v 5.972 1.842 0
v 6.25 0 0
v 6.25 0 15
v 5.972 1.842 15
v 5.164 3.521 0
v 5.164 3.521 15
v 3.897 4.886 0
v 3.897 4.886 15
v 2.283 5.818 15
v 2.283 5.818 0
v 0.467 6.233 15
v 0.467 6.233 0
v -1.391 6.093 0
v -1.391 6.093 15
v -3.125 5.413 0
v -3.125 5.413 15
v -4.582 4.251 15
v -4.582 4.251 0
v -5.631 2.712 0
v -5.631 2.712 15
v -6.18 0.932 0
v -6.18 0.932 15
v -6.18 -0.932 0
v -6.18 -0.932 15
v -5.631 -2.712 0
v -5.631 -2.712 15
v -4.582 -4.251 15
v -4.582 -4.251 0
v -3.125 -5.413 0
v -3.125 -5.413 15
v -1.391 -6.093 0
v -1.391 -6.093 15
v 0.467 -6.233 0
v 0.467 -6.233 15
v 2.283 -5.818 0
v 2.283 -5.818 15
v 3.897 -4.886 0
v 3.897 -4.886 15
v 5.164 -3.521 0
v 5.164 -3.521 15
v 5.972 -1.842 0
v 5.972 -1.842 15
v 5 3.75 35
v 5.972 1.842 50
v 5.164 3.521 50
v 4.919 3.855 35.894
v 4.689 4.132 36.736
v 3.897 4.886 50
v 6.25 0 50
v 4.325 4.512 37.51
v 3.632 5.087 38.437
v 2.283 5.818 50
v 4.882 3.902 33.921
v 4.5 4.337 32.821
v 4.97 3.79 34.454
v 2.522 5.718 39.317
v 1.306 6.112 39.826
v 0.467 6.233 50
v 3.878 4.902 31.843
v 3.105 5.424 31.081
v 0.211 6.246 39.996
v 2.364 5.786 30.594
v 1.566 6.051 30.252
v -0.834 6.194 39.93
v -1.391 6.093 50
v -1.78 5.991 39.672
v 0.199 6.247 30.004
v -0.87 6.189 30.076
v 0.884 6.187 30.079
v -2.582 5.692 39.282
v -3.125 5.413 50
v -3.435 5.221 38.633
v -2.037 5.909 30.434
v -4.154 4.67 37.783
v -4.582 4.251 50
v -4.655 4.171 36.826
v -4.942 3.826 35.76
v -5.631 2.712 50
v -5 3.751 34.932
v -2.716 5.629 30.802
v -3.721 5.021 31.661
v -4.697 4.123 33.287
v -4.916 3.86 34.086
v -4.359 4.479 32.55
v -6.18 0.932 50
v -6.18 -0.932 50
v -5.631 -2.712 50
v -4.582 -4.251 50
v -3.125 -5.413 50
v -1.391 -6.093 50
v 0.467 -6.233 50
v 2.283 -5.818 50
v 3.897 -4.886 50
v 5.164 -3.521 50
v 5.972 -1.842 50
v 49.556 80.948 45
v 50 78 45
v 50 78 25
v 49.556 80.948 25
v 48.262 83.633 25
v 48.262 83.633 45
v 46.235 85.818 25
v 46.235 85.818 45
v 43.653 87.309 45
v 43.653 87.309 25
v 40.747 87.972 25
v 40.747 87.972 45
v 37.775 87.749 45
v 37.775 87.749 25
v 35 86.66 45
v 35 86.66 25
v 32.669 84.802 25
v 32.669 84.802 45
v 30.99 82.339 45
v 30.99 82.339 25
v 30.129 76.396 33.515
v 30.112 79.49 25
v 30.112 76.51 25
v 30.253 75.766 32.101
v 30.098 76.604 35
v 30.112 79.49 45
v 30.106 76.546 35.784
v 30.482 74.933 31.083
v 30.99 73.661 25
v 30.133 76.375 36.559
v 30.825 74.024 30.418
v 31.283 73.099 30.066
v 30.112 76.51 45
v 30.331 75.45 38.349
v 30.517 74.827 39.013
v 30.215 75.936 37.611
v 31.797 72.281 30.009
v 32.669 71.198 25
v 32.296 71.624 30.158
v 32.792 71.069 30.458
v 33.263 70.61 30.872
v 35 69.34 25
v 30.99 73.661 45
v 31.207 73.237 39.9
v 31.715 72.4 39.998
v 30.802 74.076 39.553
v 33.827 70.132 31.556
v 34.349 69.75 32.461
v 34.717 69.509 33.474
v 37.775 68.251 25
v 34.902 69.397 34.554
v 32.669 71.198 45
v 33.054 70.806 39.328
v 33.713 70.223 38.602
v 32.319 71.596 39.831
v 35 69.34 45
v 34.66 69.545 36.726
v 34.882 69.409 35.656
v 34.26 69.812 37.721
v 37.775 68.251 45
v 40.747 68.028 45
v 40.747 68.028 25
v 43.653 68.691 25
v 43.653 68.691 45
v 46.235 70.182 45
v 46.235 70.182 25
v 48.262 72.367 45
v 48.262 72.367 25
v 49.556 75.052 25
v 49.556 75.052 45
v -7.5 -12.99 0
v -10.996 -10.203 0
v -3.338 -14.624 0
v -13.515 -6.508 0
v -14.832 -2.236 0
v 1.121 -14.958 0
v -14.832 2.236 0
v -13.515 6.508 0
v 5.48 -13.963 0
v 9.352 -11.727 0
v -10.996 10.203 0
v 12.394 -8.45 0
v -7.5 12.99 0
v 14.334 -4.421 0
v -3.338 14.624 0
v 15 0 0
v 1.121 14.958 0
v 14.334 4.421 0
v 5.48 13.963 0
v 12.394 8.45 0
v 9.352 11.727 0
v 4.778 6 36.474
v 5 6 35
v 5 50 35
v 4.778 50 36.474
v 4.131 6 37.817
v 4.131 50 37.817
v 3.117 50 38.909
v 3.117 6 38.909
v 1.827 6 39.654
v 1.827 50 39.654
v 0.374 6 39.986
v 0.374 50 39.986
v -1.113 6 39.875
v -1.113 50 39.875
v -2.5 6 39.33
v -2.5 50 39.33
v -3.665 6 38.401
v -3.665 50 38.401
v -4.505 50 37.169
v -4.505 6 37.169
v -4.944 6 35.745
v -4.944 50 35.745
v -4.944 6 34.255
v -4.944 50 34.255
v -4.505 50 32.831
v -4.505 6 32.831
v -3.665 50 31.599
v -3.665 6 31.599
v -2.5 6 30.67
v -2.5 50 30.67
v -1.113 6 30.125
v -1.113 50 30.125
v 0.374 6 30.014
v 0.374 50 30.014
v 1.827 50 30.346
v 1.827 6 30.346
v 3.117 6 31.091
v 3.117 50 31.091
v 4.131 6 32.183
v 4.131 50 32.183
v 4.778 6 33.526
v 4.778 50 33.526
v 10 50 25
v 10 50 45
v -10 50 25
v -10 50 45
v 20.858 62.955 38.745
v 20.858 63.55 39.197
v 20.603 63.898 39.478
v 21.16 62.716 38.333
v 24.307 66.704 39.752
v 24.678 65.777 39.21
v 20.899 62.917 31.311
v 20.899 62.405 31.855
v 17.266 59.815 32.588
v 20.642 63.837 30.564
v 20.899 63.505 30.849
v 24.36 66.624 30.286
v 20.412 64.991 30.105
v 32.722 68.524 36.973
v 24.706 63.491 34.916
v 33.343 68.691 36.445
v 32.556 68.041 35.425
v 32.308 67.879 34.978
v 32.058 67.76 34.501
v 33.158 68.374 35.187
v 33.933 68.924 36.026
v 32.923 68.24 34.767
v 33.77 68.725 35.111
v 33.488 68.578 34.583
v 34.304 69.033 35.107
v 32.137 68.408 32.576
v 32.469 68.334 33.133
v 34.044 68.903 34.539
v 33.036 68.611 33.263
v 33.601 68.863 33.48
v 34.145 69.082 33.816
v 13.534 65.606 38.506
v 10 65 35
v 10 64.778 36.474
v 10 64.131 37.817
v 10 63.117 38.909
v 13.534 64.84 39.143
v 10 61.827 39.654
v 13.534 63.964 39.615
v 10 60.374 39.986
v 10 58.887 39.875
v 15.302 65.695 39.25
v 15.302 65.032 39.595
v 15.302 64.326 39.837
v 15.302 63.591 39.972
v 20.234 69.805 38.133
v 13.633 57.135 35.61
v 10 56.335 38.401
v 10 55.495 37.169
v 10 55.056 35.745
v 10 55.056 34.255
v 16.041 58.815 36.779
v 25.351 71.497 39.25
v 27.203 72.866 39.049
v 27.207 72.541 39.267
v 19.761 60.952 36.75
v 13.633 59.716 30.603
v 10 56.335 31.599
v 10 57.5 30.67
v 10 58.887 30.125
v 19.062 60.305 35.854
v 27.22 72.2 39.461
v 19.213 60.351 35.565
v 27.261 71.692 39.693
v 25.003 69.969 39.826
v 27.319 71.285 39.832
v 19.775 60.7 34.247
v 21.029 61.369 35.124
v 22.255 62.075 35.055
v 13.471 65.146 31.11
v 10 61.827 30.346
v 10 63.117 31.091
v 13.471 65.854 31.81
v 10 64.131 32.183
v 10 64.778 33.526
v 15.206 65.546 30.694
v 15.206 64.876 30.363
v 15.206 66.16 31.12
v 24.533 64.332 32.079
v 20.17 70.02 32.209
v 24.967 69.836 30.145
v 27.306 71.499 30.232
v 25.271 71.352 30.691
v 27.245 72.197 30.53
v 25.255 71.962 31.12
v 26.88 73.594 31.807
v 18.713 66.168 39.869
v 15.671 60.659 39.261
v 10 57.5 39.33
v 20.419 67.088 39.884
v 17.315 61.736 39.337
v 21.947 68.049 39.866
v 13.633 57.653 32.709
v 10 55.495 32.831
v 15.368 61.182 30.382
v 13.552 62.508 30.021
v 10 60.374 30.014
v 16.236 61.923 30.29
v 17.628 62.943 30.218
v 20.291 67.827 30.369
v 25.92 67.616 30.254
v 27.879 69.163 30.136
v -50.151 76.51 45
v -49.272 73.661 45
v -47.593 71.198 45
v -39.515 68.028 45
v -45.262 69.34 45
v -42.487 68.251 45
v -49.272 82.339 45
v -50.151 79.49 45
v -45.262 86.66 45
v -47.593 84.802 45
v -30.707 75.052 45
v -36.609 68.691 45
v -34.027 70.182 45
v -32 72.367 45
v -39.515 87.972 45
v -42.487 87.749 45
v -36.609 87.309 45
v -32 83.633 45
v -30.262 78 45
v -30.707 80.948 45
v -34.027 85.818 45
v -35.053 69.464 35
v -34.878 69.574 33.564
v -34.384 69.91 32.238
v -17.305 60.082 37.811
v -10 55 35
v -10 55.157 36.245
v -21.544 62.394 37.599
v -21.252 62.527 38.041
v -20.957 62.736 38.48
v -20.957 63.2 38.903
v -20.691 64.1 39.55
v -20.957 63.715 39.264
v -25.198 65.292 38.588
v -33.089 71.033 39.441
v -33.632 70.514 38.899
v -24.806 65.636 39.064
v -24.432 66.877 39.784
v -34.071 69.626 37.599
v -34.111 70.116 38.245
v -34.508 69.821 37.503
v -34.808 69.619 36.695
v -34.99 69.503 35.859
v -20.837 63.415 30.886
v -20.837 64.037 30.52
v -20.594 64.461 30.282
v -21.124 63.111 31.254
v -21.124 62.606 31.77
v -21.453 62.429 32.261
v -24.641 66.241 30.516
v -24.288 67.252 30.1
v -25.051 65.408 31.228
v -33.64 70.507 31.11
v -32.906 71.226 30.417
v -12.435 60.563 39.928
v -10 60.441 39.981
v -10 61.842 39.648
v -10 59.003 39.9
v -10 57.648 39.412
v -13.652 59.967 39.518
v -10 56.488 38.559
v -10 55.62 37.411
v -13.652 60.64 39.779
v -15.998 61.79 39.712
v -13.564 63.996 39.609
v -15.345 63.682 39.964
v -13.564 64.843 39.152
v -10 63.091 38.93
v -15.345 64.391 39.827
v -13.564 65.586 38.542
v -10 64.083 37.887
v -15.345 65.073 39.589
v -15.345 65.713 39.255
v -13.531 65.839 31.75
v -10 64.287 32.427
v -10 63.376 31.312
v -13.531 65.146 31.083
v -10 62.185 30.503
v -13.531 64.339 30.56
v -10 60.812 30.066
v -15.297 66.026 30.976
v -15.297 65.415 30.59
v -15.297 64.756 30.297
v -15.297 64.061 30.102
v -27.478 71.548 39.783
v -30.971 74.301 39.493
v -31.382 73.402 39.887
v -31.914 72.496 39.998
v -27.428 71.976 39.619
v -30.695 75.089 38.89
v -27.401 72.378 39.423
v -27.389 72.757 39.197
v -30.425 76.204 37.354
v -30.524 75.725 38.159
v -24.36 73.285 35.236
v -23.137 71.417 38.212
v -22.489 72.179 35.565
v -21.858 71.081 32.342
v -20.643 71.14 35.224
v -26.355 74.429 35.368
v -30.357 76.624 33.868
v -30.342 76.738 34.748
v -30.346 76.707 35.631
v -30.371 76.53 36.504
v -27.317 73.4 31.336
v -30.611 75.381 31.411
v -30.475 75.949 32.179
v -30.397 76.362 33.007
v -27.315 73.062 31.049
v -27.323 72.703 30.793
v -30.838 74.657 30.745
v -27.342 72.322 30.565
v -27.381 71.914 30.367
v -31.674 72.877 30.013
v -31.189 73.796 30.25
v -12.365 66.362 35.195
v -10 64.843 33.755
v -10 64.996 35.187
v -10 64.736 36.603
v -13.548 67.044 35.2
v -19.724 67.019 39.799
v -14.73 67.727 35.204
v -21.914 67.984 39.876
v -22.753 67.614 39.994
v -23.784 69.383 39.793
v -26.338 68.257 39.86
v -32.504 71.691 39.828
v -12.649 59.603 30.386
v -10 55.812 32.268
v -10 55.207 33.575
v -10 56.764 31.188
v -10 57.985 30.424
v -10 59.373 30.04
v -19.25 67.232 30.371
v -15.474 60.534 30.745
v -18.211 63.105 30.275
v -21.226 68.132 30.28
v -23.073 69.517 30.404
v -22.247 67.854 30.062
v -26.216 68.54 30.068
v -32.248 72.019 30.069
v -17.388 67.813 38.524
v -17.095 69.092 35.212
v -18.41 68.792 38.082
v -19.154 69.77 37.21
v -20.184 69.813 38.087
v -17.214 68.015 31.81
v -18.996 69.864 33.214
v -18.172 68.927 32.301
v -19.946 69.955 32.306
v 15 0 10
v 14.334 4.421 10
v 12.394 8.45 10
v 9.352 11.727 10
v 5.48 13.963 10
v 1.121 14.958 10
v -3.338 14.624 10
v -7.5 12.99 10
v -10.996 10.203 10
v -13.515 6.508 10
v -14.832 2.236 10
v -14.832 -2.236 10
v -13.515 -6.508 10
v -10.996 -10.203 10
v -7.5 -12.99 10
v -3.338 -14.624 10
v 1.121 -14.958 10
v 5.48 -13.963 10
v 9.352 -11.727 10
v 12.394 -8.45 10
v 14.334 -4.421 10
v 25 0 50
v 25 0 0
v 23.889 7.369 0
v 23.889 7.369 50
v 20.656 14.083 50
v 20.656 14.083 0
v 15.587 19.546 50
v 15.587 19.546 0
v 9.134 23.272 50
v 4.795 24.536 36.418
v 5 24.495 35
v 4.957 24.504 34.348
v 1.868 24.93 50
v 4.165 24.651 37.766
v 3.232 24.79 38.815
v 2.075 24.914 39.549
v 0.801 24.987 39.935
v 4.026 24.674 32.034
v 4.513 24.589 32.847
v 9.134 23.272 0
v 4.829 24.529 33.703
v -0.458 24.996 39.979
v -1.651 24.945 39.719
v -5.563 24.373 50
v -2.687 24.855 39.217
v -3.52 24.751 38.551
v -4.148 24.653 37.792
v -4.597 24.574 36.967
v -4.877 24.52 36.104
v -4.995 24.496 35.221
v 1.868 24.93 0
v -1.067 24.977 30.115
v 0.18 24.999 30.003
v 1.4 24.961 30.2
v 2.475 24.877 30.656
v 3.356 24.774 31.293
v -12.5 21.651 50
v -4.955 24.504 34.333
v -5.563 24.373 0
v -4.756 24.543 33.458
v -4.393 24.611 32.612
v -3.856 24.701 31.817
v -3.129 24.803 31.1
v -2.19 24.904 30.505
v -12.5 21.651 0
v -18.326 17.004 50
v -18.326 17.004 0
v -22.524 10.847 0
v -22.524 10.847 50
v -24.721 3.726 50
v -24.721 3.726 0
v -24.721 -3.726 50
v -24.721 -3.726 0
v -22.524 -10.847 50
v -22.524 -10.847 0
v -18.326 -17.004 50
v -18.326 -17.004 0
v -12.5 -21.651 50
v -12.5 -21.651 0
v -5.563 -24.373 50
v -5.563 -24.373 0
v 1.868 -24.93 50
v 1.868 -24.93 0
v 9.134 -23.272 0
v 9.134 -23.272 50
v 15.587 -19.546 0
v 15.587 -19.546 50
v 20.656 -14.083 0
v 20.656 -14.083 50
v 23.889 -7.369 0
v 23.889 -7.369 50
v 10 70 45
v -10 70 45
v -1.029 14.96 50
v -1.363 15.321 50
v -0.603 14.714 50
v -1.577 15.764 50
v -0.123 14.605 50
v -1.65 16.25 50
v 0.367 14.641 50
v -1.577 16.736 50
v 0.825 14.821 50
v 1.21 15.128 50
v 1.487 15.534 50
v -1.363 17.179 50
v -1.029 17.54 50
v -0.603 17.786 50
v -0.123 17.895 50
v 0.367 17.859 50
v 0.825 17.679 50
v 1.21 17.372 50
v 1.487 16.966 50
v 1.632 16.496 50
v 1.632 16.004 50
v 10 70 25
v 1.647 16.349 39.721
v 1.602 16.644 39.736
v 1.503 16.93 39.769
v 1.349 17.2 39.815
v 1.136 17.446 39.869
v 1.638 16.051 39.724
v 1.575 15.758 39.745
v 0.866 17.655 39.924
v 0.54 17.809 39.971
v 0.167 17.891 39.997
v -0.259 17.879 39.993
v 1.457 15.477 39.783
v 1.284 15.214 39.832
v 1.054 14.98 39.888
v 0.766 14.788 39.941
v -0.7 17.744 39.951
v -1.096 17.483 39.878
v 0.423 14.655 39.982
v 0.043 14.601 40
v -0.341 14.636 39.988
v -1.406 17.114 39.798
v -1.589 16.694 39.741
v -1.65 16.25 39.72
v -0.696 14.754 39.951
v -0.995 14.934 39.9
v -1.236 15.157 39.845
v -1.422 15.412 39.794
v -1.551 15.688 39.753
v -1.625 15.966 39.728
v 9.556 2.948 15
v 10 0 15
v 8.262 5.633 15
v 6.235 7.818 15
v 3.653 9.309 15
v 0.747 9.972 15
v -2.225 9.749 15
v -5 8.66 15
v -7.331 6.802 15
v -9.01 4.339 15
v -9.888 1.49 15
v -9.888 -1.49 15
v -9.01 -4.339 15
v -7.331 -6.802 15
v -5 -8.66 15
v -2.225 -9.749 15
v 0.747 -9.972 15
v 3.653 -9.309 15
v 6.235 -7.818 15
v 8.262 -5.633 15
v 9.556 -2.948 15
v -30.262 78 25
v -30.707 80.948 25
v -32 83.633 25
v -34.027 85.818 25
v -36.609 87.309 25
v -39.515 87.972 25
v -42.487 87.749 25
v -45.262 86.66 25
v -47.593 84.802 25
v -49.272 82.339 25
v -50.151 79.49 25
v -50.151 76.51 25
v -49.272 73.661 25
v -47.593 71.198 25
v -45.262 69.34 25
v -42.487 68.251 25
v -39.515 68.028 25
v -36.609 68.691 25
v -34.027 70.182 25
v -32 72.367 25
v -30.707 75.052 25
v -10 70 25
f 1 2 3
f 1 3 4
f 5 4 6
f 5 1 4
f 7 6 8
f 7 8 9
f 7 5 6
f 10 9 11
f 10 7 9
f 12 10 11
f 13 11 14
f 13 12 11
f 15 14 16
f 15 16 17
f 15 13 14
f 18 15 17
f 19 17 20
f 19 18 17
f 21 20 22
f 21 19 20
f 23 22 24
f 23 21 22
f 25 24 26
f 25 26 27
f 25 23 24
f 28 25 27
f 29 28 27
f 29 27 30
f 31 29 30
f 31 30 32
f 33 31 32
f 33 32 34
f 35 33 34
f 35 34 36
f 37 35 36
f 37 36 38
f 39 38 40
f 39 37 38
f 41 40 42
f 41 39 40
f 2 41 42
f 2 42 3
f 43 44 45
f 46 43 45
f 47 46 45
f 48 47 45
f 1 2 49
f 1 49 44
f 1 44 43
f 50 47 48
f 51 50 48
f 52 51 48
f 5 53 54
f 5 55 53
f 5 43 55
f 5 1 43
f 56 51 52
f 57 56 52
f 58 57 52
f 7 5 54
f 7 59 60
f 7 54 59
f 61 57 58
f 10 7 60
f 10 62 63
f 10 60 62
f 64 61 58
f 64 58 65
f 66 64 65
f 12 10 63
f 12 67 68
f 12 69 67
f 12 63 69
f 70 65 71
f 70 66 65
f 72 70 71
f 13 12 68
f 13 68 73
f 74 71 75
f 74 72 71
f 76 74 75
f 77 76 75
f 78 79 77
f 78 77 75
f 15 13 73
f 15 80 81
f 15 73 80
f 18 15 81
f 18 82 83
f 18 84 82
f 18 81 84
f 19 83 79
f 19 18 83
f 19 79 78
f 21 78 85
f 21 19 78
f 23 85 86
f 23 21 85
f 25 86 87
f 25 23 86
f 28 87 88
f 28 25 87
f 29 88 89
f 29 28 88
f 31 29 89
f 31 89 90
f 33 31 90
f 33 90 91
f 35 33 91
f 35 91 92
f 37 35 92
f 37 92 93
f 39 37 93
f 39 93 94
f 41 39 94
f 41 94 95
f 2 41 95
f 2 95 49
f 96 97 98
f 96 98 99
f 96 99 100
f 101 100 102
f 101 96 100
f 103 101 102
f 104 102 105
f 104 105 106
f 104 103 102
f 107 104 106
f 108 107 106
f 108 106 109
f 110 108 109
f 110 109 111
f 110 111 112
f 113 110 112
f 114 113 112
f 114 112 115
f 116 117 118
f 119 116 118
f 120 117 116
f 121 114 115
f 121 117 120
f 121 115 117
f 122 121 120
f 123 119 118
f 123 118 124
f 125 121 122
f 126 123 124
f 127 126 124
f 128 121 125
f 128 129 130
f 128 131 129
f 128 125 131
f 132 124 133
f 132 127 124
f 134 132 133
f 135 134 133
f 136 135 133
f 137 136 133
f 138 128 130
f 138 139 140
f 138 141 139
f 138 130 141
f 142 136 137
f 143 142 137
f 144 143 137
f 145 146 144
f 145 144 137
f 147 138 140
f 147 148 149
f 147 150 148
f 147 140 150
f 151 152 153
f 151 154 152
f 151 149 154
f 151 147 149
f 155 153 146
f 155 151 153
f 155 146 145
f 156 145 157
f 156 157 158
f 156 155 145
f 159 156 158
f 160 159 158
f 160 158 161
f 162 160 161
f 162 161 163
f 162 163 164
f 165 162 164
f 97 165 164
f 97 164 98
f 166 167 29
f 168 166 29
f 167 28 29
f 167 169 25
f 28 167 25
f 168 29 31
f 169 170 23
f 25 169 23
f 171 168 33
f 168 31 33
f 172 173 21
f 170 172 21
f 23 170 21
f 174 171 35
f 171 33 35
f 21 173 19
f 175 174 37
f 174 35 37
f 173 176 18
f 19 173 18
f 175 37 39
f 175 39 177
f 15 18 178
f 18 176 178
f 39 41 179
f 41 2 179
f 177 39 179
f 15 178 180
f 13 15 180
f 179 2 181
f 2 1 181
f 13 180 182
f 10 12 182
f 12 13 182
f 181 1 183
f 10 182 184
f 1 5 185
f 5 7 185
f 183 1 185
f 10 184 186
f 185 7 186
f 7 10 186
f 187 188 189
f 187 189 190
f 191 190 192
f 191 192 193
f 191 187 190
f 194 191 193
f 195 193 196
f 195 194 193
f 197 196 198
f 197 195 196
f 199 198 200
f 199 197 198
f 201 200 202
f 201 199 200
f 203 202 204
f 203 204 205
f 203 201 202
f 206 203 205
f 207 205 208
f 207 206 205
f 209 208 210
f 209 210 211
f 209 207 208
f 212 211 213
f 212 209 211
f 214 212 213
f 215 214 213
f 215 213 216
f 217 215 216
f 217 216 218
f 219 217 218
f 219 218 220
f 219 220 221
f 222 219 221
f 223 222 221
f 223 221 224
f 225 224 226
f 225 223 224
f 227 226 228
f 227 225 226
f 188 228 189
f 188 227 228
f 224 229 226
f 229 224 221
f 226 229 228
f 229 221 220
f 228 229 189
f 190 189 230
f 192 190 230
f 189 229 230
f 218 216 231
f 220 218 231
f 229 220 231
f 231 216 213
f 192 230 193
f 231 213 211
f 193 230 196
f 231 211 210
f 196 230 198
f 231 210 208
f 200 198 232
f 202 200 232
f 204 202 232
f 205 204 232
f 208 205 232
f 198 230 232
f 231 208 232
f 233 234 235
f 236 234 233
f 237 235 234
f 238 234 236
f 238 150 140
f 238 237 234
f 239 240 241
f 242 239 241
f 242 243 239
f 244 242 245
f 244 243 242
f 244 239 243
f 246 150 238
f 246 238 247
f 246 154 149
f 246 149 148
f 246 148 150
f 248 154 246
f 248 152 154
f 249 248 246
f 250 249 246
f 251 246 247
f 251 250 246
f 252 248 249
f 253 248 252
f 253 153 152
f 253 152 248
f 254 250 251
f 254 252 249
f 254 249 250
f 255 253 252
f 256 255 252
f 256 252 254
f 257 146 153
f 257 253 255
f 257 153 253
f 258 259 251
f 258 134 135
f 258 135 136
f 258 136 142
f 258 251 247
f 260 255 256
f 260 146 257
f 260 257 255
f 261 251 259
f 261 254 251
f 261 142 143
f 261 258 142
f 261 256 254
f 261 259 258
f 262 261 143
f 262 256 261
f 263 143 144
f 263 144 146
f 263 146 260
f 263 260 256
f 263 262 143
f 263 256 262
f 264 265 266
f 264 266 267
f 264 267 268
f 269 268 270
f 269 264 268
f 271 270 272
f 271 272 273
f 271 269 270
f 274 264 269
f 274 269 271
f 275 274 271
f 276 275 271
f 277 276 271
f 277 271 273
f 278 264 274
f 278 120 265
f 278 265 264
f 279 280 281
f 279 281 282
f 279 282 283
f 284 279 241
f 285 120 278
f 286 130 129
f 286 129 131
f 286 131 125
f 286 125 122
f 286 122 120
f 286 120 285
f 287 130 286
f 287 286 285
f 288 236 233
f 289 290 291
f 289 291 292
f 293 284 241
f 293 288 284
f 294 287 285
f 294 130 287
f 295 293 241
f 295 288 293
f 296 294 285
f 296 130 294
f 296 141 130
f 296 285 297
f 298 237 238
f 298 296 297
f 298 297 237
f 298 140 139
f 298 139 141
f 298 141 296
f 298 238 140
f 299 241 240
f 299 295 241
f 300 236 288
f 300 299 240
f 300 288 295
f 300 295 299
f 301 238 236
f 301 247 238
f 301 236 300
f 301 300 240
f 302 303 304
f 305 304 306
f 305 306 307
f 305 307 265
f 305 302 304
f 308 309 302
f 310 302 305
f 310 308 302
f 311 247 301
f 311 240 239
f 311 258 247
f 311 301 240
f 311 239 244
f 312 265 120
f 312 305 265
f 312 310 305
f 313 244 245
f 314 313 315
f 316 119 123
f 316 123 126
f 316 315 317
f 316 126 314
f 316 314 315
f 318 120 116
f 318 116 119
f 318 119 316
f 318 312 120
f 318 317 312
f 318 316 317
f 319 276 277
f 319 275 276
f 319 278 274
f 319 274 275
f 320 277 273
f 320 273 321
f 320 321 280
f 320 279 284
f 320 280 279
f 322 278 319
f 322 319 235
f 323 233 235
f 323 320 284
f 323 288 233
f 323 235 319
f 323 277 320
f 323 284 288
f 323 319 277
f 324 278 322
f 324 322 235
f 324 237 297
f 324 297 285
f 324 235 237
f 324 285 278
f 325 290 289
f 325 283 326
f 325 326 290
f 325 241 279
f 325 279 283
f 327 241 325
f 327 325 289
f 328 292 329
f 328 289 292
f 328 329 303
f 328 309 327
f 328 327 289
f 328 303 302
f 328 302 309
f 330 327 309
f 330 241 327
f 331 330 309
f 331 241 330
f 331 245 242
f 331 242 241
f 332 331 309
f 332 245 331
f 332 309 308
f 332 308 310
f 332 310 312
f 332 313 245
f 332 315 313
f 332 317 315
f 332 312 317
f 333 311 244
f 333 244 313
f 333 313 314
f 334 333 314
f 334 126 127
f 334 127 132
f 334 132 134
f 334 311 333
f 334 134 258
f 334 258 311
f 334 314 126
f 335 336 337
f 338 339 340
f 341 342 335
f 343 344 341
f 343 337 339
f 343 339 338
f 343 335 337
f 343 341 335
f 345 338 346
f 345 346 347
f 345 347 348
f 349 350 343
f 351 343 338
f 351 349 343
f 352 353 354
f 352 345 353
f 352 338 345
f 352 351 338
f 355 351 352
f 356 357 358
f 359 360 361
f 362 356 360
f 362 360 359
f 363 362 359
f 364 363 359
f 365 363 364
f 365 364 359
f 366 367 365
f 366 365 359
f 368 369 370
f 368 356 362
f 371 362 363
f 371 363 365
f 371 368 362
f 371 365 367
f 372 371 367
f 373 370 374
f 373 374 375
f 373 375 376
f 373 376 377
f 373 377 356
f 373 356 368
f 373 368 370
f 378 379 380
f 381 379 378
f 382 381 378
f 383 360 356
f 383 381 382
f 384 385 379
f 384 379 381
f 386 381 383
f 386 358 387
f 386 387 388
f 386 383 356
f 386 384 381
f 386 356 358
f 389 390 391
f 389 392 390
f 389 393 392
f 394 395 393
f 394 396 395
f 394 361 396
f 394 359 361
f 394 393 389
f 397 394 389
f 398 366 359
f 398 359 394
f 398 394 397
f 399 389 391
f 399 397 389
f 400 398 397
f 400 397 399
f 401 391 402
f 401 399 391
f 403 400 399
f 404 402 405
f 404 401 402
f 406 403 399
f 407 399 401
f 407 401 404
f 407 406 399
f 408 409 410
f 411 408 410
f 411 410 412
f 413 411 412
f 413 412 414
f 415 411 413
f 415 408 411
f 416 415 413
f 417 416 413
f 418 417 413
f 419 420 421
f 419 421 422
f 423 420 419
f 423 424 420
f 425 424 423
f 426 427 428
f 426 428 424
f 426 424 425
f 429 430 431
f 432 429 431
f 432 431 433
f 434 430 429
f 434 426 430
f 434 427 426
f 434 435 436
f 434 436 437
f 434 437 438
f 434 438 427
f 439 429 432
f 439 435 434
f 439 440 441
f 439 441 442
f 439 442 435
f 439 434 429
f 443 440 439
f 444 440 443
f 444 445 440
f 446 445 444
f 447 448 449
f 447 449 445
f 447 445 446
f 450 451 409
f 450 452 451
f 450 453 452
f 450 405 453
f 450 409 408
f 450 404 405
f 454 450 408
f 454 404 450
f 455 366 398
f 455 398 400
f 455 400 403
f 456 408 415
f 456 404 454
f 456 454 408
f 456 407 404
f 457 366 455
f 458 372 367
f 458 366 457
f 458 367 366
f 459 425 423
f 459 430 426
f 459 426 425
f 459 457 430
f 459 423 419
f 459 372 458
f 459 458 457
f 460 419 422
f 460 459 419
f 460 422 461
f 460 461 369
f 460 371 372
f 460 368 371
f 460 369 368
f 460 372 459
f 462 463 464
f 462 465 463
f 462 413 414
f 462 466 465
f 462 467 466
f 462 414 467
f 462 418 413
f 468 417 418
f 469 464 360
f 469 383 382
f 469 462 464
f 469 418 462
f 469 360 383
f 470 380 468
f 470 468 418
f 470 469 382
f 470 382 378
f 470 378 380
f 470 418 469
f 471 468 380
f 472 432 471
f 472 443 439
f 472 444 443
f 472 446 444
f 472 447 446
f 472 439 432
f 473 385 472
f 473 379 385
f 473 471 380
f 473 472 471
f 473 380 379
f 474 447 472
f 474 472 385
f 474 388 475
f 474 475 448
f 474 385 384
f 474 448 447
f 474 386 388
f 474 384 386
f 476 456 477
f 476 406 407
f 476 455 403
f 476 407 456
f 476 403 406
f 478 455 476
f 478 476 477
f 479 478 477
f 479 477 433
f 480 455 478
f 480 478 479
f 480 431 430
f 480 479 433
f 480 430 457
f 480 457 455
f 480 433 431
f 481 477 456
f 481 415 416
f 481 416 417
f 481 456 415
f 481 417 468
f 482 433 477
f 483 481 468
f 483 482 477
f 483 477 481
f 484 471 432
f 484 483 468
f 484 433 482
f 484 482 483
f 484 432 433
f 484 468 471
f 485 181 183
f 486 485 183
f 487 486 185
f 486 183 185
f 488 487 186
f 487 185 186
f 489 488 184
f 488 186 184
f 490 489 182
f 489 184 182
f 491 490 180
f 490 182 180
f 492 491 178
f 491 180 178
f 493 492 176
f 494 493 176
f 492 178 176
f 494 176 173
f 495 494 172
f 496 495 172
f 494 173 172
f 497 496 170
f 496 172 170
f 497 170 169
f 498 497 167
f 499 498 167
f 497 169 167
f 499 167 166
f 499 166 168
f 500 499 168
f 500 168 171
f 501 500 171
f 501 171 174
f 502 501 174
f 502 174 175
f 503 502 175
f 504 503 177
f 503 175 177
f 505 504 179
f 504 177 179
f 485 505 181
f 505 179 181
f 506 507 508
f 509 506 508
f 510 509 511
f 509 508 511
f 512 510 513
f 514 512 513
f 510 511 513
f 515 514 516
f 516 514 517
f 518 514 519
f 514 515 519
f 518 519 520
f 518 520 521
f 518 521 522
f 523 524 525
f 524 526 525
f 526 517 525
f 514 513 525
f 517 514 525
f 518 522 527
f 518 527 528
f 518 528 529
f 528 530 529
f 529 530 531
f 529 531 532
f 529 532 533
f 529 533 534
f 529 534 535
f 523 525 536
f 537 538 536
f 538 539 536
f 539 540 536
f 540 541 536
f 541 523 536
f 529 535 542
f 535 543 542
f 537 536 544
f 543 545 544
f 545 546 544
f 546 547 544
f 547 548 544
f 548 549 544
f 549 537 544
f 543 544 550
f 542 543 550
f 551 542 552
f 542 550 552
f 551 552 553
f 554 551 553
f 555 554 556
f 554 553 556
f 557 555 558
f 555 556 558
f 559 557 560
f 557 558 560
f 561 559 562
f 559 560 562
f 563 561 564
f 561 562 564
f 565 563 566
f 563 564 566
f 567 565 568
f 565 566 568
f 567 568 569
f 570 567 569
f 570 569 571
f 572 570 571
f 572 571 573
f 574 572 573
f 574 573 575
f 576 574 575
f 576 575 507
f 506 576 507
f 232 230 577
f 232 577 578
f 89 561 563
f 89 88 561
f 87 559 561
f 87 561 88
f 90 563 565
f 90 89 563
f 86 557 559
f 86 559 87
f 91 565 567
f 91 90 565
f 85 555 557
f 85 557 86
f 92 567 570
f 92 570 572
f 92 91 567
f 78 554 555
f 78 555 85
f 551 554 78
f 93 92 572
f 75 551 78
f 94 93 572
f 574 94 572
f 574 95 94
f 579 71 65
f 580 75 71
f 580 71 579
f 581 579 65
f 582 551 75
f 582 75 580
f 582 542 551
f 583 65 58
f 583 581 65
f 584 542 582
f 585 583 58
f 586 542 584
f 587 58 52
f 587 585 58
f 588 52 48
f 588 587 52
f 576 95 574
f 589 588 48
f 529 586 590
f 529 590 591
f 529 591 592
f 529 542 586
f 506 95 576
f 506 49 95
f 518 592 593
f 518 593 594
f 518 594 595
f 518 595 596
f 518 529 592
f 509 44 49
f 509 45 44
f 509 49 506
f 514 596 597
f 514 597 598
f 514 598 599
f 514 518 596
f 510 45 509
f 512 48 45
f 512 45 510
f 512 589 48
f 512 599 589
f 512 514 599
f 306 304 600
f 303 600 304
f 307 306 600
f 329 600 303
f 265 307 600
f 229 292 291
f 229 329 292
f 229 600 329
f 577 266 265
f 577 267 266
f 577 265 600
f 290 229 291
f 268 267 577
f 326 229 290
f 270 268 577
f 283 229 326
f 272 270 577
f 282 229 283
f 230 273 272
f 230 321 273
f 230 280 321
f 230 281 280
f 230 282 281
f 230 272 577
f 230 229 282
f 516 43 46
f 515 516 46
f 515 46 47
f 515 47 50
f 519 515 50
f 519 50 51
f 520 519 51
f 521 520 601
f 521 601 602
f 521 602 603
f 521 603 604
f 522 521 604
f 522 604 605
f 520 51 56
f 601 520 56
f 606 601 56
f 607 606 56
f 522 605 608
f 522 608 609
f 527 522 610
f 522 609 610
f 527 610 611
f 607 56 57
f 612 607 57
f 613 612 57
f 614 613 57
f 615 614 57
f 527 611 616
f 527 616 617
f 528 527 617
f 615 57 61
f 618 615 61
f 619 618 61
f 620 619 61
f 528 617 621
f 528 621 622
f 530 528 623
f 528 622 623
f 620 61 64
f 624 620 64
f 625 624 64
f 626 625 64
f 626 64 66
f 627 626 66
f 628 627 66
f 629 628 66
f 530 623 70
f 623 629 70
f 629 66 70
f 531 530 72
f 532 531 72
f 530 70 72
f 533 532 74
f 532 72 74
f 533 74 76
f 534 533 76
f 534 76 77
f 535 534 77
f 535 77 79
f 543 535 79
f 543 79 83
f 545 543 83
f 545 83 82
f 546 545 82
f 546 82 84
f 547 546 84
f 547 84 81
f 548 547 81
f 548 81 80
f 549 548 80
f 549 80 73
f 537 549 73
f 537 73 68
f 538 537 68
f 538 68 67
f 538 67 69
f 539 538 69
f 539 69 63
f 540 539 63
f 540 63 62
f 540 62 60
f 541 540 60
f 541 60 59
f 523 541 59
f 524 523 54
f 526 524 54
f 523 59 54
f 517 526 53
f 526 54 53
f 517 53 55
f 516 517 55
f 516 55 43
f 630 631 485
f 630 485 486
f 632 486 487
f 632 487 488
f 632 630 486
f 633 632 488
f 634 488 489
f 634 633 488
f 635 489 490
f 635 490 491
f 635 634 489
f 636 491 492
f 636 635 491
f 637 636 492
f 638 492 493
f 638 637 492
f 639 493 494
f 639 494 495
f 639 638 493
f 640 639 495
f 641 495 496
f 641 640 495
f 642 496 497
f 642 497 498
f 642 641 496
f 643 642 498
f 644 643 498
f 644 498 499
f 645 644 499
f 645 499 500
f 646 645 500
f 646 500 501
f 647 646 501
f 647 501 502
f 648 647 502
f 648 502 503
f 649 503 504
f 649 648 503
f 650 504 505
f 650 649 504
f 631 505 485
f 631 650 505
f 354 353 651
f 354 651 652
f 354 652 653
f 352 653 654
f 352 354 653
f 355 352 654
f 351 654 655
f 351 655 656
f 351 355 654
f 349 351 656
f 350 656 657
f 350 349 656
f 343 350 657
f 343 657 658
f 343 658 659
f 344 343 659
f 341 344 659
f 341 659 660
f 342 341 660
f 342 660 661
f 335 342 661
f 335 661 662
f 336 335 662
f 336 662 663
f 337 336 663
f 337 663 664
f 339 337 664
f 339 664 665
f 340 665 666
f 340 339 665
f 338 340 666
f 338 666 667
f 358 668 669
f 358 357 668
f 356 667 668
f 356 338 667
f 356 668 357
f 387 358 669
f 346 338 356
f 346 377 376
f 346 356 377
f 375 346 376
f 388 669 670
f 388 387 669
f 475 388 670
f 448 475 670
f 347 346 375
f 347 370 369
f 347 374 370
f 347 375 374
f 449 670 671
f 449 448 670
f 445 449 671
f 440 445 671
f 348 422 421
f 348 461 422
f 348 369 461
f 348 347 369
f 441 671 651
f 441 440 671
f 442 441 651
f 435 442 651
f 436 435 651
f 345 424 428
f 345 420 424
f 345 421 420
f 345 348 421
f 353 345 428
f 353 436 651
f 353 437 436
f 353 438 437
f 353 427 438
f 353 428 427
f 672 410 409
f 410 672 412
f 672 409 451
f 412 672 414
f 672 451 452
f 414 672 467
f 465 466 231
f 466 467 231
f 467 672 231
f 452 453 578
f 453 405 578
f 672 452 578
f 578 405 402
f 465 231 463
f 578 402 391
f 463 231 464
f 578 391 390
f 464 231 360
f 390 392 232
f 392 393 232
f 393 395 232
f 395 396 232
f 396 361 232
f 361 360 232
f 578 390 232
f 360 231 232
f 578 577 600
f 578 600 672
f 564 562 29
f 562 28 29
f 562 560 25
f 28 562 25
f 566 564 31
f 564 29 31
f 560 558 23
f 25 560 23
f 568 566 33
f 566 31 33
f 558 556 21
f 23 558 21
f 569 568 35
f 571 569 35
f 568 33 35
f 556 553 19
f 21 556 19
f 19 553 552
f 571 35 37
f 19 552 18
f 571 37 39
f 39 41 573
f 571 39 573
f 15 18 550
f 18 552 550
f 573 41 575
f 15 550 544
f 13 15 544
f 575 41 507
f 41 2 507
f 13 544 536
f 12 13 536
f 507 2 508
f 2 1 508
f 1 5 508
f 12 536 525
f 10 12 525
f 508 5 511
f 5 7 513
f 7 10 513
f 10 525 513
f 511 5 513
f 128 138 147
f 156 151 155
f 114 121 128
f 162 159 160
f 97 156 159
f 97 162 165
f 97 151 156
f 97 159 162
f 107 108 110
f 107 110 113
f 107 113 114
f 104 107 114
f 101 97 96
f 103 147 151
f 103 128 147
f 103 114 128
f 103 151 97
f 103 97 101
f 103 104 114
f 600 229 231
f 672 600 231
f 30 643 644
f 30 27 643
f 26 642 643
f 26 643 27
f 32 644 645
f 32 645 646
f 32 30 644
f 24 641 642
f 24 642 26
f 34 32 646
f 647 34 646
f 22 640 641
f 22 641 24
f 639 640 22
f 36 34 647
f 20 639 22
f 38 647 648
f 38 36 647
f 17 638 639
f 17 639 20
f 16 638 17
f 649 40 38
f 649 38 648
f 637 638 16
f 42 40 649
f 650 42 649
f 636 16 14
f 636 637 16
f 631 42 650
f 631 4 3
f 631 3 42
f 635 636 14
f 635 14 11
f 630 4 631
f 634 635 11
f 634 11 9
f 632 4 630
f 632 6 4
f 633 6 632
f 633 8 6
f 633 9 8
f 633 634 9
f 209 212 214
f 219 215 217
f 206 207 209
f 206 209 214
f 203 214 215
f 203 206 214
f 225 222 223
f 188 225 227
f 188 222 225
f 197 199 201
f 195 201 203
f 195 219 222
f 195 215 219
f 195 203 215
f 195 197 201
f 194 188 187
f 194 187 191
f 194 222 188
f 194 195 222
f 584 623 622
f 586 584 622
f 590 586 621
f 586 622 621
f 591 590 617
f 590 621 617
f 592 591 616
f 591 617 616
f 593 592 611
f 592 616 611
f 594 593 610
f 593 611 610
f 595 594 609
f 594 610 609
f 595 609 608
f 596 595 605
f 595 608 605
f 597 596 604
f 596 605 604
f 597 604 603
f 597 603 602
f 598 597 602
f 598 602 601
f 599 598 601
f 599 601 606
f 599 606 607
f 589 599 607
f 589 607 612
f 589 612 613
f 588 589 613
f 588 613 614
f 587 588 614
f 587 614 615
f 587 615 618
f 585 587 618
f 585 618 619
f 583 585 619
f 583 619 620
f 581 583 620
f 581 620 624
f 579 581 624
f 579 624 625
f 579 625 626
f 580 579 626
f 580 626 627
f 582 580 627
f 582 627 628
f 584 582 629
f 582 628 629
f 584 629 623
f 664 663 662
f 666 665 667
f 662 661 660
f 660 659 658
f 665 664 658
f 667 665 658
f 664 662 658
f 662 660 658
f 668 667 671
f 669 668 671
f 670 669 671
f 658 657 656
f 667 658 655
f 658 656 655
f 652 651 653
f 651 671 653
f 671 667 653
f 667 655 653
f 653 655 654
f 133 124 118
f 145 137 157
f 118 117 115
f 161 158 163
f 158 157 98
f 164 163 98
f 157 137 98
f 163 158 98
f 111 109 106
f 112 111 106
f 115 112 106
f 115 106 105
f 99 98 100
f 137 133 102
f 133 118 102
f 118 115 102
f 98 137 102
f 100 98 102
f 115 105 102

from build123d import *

# Parameters (mm, degrees)
F0_R      = 25
F0_R_2    = 6.25
F1_DEPTH  = 50
F2_R      = 5
F3_DEPTH  = 25
F5_D      = 3.3
F5_DEPTH  = 12
F5_TIP    = 0.9914200214
F7_START  = -6
F6_R      = 5
F7_DEPTH  = 44
F8_W      = 20
F8_H      = 20
F9_DEPTH  = 20
F13_R     = 5
F12_R     = 5
F16_R     = 10
F17_DEPTH = 20
F18_R     = 15
F18_R_2   = 6.25
F19_DEPTH = 15
F20_SIZE  = 5


with BuildPart() as f1:
    # F0 (on Top) → F1 (new body)
    with BuildSketch(Plane.XY):
        Circle(F0_R)
        Circle(F0_R_2, mode=Mode.SUBTRACT)
    extrude(amount=F1_DEPTH)

    # F2 (on Front) → F3 (cut)
    with BuildSketch(Plane.XZ):
        with Locations((0, 35)):
            Circle(F2_R)
    extrude(amount=-F3_DEPTH, mode=Mode.SUBTRACT)

    # F5
    with Locations(Plane.XY.offset(50)):
        with Locations((0, 16.25)):
            Hole(F5_D / 2, depth=F5_DEPTH)
            with Locations((0, 0, -(F5_DEPTH + F5_TIP / 2))):  # 118° drill point
                Cone(0, F5_D / 2, F5_TIP, mode=Mode.SUBTRACT)


with BuildPart() as f7:
    # F6 (on Front) → F7 (new body)
    with BuildSketch(Plane.XZ.offset(F7_START)):
        with Locations((0, 35)):
            Circle(F6_R)
    extrude(amount=-F7_DEPTH)

    # F8 (on face) → F9 (join)
    with BuildSketch(Plane(origin=(0, 50, 0), x_dir=(-1, 0, 0), z_dir=(0, 1, 0))):
        with Locations((0, 35)):
            Rectangle(F8_W, F8_H)
    extrude(amount=F9_DEPTH)

    # F14: sweep along a path in F10
    with BuildLine(Plane.XY.offset(45)) as f14_path:
        Line((10, 60), (40, 77.3205080757))
    # F13 (on face) → F14 (sweep)
    with BuildSketch(Plane.YZ.offset(10)):
        with Locations((60, 35)):
            Circle(F13_R)
    sweep(path=f14_path.line)

    # F15: sweep along a path in F11
    with BuildLine(Plane.XY.offset(45)) as f15_path:
        Line((-9.9534913898, 60), (-40, 77.3473598343))
    # F12 (on face) → F15 (sweep)
    with BuildSketch(Plane(origin=(-10, 0, 0), x_dir=(0, -1, 0), z_dir=(-1, 0, 0))):
        with Locations((-60, 35)):
            Circle(F12_R)
    sweep(path=f15_path.line)

    # F16 (on face) → F17 (join)
    with BuildSketch(Plane.XY.offset(45)):
        with Locations((40, 78)):
            Circle(F16_R)
        with Locations((-40.2622669935, 78)):
            Circle(F16_R)
    extrude(amount=-F17_DEPTH)


with BuildPart() as f19:
    # F18 (on Top) → F19 (new body)
    with BuildSketch(Plane.XY):
        Circle(F18_R)
        Circle(F18_R_2, mode=Mode.SUBTRACT)
    extrude(amount=F19_DEPTH)

    # F20
    f20_edges = [f19.edges().sort_by_distance(p)[0] for p in [
        (-15, 0, 15),
    ]]
    chamfer(f20_edges, length=F20_SIZE)


solid = Compound([f1.part, f7.part, f19.part])
